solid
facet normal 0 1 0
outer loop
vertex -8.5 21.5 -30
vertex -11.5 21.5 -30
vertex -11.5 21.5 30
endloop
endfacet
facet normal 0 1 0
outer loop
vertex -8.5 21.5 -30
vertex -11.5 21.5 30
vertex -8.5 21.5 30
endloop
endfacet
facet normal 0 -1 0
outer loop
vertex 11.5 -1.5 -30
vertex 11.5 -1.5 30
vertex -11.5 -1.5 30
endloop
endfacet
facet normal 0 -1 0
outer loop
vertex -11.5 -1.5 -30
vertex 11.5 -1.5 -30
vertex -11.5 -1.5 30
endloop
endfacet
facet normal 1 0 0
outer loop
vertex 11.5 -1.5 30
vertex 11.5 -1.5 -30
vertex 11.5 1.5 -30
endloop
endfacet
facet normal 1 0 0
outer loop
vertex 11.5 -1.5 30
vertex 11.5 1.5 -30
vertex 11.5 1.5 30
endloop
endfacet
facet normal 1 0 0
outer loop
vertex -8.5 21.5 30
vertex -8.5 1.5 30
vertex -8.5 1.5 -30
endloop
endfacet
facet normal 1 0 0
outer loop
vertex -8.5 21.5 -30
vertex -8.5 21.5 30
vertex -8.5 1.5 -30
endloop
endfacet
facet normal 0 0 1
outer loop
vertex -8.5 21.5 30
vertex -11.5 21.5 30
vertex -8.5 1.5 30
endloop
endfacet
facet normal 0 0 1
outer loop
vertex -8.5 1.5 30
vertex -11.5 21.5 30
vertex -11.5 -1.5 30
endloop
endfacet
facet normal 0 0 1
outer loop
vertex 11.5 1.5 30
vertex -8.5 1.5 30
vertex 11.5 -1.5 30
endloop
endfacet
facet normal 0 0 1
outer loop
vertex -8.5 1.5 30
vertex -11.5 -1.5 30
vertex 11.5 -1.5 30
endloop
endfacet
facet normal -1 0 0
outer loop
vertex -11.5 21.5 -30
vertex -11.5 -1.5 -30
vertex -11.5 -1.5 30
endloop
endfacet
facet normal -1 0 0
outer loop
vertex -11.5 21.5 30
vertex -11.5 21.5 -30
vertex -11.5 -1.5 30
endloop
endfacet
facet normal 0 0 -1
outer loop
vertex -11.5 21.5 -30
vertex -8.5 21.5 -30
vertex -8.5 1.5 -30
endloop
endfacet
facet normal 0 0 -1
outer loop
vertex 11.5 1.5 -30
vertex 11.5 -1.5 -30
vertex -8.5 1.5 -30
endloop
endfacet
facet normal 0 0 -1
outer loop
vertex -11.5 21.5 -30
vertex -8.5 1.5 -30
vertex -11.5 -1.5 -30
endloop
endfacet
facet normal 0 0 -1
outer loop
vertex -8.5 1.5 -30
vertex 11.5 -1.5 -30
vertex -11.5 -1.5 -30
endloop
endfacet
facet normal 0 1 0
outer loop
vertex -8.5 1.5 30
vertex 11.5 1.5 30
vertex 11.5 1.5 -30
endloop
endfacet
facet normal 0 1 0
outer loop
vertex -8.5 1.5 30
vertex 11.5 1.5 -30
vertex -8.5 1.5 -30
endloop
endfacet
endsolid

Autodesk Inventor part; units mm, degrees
ref_plane "YZ Plane" through (0, 0, 0) normal (1, 0, 0) x (0, 1, 0)
ref_plane "XZ Plane" through (0, 0, 0) normal (0, 1, 0) x (-1, 0, 0)
ref_plane "XY Plane" through (0, 0, 0) normal (0, 0, 1) x (1, 0, 0)
sketch "Sketch1" plane through (0, 0, 0) normal (0, 1, 0) x (-1, 0, 0)
  line L0 (-11.5, 30) -> (11.5, 30)
  line L1 (11.5, 30) -> (11.5, -30)
  line L2 (11.5, -30) -> (-11.5, -30)
  line L3 (-11.5, -30) -> (-11.5, 30)
  line L4 (-11.5, 30) -> (11.5, -30) construction
  line L5 (11.5, 30) -> (-11.5, -30) construction
  point P0 (0, 0)
  dimension "d0" = 23
  dimension "d1" = 60
extrude "Extrusion1" add sketch "Sketch1" along normal mid plane 3
sketch "Sketch2" plane through (0, 1.5, 0) normal (0, 1, 0) x (1, 0, 0)
  line L0 (-11.5, -30) -> (11.5, -30) projected
  line L1 (-11.5, -30) -> (-8.5, -30)
  line L2 (-8.5, -30) -> (-8.5, 30)
  line L3 (-8.5, 30) -> (-11.5, 30)
  line L4 (-11.5, 30) -> (-11.5, -30)
  line L5 (11.5, 30) -> (-11.5, 30) projected
  point P0 (0, 0)
  dimension "d4" = 3
extrude "Extrusion2" add sketch "Sketch2" along normal blind 20
properties part number "CameraLBracket"
